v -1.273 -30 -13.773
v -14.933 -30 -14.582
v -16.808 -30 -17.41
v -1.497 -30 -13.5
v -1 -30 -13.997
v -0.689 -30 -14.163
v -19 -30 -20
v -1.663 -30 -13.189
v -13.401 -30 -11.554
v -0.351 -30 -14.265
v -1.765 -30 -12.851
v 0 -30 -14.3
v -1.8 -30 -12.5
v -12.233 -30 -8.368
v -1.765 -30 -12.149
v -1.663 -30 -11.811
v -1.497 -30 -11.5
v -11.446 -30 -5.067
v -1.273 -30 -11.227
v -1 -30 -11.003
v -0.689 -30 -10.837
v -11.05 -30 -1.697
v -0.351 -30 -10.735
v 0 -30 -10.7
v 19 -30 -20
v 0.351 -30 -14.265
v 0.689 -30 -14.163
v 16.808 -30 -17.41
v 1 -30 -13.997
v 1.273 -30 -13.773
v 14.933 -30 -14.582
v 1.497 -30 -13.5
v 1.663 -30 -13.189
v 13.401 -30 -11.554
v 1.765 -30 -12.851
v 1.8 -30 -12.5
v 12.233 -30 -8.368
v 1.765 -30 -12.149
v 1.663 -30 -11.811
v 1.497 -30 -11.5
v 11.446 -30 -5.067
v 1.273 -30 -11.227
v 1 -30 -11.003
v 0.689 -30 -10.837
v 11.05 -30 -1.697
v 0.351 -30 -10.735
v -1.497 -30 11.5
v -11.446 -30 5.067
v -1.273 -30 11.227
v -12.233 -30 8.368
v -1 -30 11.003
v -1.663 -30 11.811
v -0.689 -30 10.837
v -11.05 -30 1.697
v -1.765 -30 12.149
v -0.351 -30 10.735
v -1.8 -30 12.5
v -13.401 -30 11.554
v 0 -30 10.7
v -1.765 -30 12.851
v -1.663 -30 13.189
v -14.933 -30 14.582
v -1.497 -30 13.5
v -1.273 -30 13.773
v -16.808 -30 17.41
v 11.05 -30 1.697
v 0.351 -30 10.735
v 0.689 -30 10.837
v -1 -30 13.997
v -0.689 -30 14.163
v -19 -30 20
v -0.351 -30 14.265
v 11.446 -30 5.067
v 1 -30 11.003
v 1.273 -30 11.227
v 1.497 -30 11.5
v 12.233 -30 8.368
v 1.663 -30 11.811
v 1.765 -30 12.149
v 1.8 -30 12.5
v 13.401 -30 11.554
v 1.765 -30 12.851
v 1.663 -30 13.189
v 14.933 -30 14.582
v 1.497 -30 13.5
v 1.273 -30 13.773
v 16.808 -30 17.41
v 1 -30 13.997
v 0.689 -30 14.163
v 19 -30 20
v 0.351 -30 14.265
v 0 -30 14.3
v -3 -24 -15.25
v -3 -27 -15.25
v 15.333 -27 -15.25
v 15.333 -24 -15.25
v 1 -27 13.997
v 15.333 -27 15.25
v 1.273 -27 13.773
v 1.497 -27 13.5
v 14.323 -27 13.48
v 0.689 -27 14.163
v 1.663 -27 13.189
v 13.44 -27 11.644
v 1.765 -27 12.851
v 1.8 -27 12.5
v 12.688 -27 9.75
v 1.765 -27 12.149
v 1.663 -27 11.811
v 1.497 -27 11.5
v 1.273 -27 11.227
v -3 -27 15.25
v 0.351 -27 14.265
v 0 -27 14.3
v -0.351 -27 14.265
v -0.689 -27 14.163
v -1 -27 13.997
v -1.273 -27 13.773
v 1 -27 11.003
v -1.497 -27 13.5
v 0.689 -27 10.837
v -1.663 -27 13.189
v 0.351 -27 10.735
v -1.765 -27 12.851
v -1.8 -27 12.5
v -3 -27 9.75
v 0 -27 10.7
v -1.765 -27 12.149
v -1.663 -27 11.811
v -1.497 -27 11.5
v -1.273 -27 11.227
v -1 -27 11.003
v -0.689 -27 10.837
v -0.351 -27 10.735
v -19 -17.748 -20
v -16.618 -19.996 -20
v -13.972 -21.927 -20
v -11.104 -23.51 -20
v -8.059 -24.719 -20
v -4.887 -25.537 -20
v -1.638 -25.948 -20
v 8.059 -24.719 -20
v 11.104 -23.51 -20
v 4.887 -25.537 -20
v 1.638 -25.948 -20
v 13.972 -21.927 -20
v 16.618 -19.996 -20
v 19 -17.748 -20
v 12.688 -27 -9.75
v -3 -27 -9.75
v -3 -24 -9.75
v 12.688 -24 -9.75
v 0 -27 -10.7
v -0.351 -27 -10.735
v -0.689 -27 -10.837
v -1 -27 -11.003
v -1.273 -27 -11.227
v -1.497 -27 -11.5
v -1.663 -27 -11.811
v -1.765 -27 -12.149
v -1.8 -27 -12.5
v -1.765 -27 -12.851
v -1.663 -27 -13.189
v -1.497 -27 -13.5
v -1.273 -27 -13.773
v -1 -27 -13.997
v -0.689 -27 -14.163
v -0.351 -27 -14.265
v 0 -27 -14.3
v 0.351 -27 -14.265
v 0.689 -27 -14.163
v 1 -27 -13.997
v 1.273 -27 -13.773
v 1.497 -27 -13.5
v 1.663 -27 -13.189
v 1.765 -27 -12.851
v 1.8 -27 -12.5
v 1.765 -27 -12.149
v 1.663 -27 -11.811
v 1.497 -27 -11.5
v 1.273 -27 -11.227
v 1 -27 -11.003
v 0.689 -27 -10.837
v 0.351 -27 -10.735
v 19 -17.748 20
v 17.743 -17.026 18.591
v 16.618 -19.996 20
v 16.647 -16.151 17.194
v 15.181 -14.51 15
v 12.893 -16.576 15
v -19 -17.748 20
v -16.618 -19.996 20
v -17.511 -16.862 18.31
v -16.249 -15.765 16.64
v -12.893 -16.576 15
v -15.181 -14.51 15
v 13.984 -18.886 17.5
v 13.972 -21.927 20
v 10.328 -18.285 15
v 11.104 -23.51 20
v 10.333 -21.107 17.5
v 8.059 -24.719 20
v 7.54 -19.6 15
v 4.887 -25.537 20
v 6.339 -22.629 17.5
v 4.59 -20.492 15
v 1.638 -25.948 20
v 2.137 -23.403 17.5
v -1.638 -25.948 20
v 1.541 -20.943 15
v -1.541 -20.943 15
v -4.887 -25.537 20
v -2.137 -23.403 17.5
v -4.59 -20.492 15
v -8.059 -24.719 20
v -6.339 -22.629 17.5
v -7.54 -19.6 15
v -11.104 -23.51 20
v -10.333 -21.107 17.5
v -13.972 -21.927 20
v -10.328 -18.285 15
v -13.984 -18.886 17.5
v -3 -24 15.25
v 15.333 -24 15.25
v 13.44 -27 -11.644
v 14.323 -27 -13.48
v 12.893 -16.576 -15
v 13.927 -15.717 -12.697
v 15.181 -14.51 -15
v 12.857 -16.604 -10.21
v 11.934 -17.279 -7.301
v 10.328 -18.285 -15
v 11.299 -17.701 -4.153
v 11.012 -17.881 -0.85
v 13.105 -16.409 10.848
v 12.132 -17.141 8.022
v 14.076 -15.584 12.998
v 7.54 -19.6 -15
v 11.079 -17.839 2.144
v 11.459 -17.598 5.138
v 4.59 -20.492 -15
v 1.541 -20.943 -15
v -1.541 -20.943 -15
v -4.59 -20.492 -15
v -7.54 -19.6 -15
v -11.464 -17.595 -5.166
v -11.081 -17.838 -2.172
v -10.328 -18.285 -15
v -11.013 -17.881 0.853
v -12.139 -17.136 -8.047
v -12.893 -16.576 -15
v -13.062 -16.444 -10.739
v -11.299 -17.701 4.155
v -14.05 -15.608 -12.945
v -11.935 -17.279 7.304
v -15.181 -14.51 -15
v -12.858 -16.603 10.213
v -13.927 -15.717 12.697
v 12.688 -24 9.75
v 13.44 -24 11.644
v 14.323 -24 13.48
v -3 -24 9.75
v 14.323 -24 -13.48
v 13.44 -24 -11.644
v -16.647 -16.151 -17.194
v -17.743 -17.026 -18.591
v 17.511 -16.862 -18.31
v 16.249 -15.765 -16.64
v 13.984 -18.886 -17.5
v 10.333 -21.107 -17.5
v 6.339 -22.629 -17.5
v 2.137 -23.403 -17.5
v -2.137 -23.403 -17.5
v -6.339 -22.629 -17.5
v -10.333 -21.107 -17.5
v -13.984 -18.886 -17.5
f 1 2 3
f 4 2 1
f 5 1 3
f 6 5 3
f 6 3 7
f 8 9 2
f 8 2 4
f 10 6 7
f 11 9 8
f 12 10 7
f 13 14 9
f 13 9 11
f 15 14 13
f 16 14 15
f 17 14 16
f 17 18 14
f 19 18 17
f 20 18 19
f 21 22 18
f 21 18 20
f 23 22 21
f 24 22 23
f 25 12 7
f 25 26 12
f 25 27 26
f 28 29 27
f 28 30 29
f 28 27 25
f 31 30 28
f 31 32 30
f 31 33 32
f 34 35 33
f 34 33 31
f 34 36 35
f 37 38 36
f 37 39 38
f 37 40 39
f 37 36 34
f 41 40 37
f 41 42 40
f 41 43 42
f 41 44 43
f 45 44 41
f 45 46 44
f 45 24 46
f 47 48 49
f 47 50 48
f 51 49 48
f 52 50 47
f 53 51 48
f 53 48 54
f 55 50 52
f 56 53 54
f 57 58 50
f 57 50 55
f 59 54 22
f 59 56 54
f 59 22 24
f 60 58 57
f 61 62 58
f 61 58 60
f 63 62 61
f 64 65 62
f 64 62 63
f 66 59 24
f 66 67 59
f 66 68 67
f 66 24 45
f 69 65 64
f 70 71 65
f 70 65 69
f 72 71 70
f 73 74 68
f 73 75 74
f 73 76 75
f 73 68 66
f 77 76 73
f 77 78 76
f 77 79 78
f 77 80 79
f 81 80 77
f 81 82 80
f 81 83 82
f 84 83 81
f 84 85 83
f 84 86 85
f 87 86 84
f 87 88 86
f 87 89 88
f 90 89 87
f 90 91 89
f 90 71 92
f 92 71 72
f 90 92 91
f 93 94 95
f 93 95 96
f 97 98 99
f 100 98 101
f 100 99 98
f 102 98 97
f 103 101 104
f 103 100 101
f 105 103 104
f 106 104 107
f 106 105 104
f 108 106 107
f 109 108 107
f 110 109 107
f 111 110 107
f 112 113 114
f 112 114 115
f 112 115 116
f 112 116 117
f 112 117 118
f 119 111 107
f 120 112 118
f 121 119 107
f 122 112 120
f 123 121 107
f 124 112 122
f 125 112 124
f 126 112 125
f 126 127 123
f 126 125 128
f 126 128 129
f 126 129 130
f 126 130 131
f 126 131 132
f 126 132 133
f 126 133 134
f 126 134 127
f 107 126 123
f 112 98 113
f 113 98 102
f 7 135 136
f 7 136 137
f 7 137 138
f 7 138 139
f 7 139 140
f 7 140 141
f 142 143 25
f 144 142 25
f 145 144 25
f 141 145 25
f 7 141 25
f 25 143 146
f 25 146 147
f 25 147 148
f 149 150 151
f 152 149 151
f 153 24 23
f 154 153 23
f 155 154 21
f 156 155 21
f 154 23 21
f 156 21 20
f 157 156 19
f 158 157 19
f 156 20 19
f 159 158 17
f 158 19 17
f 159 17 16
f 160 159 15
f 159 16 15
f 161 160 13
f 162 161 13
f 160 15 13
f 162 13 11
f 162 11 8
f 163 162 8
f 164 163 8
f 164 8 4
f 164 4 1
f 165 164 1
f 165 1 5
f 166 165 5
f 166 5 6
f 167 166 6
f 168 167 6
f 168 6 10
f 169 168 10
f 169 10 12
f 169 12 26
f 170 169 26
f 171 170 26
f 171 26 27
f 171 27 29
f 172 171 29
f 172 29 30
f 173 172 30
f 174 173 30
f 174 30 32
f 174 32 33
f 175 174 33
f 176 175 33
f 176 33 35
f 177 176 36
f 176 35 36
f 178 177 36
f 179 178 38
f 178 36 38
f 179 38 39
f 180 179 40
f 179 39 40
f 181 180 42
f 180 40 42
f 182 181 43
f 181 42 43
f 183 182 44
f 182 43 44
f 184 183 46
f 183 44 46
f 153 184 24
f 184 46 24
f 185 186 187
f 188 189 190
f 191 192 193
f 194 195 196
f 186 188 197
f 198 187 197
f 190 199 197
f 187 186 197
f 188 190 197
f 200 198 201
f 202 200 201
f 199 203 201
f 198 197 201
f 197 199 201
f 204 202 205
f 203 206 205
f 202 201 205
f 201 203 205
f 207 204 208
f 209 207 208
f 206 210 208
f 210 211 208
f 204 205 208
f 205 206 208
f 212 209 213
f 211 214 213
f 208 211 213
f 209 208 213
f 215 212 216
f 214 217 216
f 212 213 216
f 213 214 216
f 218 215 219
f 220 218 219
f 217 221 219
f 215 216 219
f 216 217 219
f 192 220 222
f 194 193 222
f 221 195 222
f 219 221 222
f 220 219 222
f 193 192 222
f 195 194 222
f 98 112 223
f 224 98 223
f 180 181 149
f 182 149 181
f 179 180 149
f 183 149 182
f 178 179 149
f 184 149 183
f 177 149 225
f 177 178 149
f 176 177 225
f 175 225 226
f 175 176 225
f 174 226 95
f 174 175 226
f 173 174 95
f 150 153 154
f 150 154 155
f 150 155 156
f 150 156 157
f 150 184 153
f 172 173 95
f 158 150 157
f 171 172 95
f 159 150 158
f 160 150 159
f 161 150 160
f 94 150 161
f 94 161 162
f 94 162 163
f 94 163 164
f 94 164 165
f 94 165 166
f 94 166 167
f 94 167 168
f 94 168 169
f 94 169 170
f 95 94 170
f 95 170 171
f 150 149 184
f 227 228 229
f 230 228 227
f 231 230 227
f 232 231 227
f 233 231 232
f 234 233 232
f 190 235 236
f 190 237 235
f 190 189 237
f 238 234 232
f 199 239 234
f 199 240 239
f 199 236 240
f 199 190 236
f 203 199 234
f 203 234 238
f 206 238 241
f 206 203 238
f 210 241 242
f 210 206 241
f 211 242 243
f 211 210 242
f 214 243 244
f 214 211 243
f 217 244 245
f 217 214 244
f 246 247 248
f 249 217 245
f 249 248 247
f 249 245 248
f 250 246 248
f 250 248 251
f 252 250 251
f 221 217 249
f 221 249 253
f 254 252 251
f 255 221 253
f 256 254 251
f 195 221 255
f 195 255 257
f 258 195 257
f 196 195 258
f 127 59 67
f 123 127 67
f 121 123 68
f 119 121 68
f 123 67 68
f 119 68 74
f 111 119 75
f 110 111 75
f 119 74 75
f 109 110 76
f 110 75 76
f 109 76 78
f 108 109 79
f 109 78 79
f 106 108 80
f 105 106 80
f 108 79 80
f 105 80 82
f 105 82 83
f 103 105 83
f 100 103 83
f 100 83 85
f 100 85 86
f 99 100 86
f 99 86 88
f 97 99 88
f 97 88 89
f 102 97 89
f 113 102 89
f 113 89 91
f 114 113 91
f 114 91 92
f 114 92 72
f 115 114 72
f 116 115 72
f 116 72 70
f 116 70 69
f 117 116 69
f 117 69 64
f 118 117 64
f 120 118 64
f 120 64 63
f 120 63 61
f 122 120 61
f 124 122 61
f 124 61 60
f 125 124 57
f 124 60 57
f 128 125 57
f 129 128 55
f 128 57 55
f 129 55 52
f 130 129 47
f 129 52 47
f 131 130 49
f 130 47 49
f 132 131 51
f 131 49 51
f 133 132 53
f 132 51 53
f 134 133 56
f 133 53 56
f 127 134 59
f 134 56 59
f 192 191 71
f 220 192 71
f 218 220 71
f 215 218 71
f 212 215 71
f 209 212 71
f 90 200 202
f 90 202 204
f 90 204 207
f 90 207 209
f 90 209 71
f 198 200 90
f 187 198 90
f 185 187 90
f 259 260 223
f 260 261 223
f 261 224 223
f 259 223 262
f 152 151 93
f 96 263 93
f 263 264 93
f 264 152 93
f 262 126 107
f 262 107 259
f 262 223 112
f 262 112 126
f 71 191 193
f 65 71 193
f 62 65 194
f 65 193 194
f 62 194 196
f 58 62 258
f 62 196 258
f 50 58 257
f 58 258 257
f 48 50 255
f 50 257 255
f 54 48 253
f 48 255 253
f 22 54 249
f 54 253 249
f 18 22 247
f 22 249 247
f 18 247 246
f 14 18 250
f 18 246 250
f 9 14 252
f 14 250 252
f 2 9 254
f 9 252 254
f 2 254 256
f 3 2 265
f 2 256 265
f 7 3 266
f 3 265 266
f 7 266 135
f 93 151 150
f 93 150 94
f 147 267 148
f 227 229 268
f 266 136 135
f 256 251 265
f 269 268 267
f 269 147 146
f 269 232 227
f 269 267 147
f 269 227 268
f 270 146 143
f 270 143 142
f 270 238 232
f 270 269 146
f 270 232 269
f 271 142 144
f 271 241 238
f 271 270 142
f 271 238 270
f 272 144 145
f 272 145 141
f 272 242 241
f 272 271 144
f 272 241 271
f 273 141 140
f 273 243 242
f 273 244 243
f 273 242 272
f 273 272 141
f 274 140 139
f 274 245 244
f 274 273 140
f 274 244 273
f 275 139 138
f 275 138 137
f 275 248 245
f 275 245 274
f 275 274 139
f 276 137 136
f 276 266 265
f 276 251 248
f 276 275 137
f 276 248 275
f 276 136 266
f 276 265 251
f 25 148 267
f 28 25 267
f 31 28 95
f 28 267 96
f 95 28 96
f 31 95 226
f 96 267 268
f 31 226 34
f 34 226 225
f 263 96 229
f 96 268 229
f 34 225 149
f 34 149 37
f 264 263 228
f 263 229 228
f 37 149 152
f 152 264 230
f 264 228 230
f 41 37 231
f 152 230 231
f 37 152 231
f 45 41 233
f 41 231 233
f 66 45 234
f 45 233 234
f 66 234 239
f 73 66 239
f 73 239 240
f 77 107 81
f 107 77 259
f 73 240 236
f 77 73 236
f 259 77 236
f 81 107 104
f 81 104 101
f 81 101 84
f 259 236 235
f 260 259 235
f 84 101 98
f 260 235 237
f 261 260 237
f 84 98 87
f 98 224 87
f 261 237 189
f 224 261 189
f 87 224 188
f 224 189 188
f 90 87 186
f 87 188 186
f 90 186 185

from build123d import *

# Parameters (mm, degrees)
BOSS_EXTRUDE1_DEPTH                 = 20
SKETCH4_R                           = 29
CUT_EXTRUDE1_DEPTH                  = 46.345892868
CHAMFER1_SIZE                       = 5
SKETCH5_W                           = 5.5
SKETCH5_H                           = 3
CUT_EXTRUDE2_DEPTH                  = 3
CUT_EXTRUDE2_DIRECTION_2_REACH      = 42.755
CUT_EXTRUDE2_DIRECTION_2_END_RADIUS = 29
SKETCH7_R                           = 1.8
CUT_EXTRUDE3_DEPTH                  = 6


with BuildPart() as part:
    # Sketch3 → Boss-Extrude1 (new, symmetric)
    with BuildSketch(Plane.XY):
        with BuildLine():
            Line((-27.5, -30), (27.5, -30))
            Line((27.5, -30), (27.5, 0))
            Line((27.5, 0), (21, 0))
            ThreePointArc((21, 0), (0, -21), (-21, 0))
            Line((-21, 0), (-27.5, 0))
            Line((-27.5, 0), (-27.5, -30))
        make_face()
    extrude(amount=BOSS_EXTRUDE1_DEPTH, both=True)

    # Sketch4 → Cut-Extrude1 (cut, through all)
    with BuildSketch(Plane(origin=(0, 0, 0), x_dir=(1, 0, 0), z_dir=(0, 1, 0))):
        with Locations((-40, 0)):
            Circle(SKETCH4_R)
        with Locations((40, 0)):
            Circle(SKETCH4_R)
    extrude(amount=-CUT_EXTRUDE1_DEPTH, mode=Mode.SUBTRACT)

    # Chamfer1
    # the kernel refuses this chamfer: 5 mm, written as the material it takes off along each edge
    with BuildSketch(Plane(origin=(0, 0, 20), x_dir=(0.9851003883005318, 0.1719803040180515, 0), z_dir=(-0.1719803040180515, 0.9851003883005318, 0))) as chamfer1_piece_1:
        Polygon((21 + CHAMFER1_SIZE, 0), (21, CHAMFER1_SIZE), (21, 0), align=None)
    revolve(axis=Axis((0, 0, 20), (0, 0, -1)), revolution_arc=199.805956235, mode=Mode.SUBTRACT)
    with BuildSketch(Plane(origin=(0, 0, -20), x_dir=(0.9851003883005321, 0.1719803040180491, 0), z_dir=(-0.1719803040180491, 0.9851003883005321, 0))) as chamfer1_piece_2:
        Polygon((21 + CHAMFER1_SIZE, 0), (21, -CHAMFER1_SIZE), (21, 0), align=None)
    revolve(axis=Axis((0, 0, -20), (0, 0, -1)), revolution_arc=199.805956235, mode=Mode.SUBTRACT)

    # Sketch5 → Cut-Extrude2 (cut)
    with BuildSketch(Plane(origin=(0, 0, 0), x_dir=(0, 0, -1), z_dir=(1, 0, 0))):
        with Locations((-12.5, -25.5)):
            Rectangle(SKETCH5_W, SKETCH5_H)
        with Locations((12.5, -25.5)):
            Rectangle(SKETCH5_W, SKETCH5_H)
    extrude(amount=-CUT_EXTRUDE2_DEPTH, mode=Mode.SUBTRACT)

    # Cut-Extrude2 direction 2: up to this cylinder (the profile starts outside it)
    cut_extrude2_direction_2_end = Plane(origin=(40, -25.5, 0), z_dir=(0, 1, 0)) * Cylinder(CUT_EXTRUDE2_DIRECTION_2_END_RADIUS, 144.51, mode=Mode.PRIVATE)
    # Sketch5 → Cut-Extrude2 direction 2 (cut, up to the surface)
    with BuildSketch(Plane(origin=(0, 0, 0), x_dir=(0, 0, -1), z_dir=(1, 0, 0)), mode=Mode.PRIVATE) as cut_extrude2_direction_2_sk1:
        with Locations((-12.5, -25.5)):
            Rectangle(SKETCH5_W, SKETCH5_H)
    cut_extrude2_direction_2_tool1 = extrude(cut_extrude2_direction_2_sk1.sketch, amount=CUT_EXTRUDE2_DIRECTION_2_REACH, mode=Mode.PRIVATE) - cut_extrude2_direction_2_end
    add(cut_extrude2_direction_2_tool1.solids().sort_by_distance((0, -25.5, 12.5))[0], mode=Mode.SUBTRACT)
    # Sketch5 → Cut-Extrude2 direction 2 (cut, up to the surface)
    with BuildSketch(Plane(origin=(0, 0, 0), x_dir=(0, 0, -1), z_dir=(1, 0, 0)), mode=Mode.PRIVATE) as cut_extrude2_direction_2_sk2:
        with Locations((12.5, -25.5)):
            Rectangle(SKETCH5_W, SKETCH5_H)
    cut_extrude2_direction_2_tool2 = extrude(cut_extrude2_direction_2_sk2.sketch, amount=CUT_EXTRUDE2_DIRECTION_2_REACH, mode=Mode.PRIVATE) - cut_extrude2_direction_2_end
    add(cut_extrude2_direction_2_tool2.solids().sort_by_distance((0, -25.5, -12.5))[0], mode=Mode.SUBTRACT)

    # Sketch7 → Cut-Extrude3 (cut)
    with BuildSketch(Plane.XZ.offset(30)):
        with Locations(Location((0, 12.5, 0), (0, 0, 270))):
            Circle(SKETCH7_R)
        with Locations(Location((0, -12.5, 0), (0, 0, 90))):
            Circle(SKETCH7_R)
    extrude(amount=-CUT_EXTRUDE3_DEPTH, mode=Mode.SUBTRACT)


solid = part.part
